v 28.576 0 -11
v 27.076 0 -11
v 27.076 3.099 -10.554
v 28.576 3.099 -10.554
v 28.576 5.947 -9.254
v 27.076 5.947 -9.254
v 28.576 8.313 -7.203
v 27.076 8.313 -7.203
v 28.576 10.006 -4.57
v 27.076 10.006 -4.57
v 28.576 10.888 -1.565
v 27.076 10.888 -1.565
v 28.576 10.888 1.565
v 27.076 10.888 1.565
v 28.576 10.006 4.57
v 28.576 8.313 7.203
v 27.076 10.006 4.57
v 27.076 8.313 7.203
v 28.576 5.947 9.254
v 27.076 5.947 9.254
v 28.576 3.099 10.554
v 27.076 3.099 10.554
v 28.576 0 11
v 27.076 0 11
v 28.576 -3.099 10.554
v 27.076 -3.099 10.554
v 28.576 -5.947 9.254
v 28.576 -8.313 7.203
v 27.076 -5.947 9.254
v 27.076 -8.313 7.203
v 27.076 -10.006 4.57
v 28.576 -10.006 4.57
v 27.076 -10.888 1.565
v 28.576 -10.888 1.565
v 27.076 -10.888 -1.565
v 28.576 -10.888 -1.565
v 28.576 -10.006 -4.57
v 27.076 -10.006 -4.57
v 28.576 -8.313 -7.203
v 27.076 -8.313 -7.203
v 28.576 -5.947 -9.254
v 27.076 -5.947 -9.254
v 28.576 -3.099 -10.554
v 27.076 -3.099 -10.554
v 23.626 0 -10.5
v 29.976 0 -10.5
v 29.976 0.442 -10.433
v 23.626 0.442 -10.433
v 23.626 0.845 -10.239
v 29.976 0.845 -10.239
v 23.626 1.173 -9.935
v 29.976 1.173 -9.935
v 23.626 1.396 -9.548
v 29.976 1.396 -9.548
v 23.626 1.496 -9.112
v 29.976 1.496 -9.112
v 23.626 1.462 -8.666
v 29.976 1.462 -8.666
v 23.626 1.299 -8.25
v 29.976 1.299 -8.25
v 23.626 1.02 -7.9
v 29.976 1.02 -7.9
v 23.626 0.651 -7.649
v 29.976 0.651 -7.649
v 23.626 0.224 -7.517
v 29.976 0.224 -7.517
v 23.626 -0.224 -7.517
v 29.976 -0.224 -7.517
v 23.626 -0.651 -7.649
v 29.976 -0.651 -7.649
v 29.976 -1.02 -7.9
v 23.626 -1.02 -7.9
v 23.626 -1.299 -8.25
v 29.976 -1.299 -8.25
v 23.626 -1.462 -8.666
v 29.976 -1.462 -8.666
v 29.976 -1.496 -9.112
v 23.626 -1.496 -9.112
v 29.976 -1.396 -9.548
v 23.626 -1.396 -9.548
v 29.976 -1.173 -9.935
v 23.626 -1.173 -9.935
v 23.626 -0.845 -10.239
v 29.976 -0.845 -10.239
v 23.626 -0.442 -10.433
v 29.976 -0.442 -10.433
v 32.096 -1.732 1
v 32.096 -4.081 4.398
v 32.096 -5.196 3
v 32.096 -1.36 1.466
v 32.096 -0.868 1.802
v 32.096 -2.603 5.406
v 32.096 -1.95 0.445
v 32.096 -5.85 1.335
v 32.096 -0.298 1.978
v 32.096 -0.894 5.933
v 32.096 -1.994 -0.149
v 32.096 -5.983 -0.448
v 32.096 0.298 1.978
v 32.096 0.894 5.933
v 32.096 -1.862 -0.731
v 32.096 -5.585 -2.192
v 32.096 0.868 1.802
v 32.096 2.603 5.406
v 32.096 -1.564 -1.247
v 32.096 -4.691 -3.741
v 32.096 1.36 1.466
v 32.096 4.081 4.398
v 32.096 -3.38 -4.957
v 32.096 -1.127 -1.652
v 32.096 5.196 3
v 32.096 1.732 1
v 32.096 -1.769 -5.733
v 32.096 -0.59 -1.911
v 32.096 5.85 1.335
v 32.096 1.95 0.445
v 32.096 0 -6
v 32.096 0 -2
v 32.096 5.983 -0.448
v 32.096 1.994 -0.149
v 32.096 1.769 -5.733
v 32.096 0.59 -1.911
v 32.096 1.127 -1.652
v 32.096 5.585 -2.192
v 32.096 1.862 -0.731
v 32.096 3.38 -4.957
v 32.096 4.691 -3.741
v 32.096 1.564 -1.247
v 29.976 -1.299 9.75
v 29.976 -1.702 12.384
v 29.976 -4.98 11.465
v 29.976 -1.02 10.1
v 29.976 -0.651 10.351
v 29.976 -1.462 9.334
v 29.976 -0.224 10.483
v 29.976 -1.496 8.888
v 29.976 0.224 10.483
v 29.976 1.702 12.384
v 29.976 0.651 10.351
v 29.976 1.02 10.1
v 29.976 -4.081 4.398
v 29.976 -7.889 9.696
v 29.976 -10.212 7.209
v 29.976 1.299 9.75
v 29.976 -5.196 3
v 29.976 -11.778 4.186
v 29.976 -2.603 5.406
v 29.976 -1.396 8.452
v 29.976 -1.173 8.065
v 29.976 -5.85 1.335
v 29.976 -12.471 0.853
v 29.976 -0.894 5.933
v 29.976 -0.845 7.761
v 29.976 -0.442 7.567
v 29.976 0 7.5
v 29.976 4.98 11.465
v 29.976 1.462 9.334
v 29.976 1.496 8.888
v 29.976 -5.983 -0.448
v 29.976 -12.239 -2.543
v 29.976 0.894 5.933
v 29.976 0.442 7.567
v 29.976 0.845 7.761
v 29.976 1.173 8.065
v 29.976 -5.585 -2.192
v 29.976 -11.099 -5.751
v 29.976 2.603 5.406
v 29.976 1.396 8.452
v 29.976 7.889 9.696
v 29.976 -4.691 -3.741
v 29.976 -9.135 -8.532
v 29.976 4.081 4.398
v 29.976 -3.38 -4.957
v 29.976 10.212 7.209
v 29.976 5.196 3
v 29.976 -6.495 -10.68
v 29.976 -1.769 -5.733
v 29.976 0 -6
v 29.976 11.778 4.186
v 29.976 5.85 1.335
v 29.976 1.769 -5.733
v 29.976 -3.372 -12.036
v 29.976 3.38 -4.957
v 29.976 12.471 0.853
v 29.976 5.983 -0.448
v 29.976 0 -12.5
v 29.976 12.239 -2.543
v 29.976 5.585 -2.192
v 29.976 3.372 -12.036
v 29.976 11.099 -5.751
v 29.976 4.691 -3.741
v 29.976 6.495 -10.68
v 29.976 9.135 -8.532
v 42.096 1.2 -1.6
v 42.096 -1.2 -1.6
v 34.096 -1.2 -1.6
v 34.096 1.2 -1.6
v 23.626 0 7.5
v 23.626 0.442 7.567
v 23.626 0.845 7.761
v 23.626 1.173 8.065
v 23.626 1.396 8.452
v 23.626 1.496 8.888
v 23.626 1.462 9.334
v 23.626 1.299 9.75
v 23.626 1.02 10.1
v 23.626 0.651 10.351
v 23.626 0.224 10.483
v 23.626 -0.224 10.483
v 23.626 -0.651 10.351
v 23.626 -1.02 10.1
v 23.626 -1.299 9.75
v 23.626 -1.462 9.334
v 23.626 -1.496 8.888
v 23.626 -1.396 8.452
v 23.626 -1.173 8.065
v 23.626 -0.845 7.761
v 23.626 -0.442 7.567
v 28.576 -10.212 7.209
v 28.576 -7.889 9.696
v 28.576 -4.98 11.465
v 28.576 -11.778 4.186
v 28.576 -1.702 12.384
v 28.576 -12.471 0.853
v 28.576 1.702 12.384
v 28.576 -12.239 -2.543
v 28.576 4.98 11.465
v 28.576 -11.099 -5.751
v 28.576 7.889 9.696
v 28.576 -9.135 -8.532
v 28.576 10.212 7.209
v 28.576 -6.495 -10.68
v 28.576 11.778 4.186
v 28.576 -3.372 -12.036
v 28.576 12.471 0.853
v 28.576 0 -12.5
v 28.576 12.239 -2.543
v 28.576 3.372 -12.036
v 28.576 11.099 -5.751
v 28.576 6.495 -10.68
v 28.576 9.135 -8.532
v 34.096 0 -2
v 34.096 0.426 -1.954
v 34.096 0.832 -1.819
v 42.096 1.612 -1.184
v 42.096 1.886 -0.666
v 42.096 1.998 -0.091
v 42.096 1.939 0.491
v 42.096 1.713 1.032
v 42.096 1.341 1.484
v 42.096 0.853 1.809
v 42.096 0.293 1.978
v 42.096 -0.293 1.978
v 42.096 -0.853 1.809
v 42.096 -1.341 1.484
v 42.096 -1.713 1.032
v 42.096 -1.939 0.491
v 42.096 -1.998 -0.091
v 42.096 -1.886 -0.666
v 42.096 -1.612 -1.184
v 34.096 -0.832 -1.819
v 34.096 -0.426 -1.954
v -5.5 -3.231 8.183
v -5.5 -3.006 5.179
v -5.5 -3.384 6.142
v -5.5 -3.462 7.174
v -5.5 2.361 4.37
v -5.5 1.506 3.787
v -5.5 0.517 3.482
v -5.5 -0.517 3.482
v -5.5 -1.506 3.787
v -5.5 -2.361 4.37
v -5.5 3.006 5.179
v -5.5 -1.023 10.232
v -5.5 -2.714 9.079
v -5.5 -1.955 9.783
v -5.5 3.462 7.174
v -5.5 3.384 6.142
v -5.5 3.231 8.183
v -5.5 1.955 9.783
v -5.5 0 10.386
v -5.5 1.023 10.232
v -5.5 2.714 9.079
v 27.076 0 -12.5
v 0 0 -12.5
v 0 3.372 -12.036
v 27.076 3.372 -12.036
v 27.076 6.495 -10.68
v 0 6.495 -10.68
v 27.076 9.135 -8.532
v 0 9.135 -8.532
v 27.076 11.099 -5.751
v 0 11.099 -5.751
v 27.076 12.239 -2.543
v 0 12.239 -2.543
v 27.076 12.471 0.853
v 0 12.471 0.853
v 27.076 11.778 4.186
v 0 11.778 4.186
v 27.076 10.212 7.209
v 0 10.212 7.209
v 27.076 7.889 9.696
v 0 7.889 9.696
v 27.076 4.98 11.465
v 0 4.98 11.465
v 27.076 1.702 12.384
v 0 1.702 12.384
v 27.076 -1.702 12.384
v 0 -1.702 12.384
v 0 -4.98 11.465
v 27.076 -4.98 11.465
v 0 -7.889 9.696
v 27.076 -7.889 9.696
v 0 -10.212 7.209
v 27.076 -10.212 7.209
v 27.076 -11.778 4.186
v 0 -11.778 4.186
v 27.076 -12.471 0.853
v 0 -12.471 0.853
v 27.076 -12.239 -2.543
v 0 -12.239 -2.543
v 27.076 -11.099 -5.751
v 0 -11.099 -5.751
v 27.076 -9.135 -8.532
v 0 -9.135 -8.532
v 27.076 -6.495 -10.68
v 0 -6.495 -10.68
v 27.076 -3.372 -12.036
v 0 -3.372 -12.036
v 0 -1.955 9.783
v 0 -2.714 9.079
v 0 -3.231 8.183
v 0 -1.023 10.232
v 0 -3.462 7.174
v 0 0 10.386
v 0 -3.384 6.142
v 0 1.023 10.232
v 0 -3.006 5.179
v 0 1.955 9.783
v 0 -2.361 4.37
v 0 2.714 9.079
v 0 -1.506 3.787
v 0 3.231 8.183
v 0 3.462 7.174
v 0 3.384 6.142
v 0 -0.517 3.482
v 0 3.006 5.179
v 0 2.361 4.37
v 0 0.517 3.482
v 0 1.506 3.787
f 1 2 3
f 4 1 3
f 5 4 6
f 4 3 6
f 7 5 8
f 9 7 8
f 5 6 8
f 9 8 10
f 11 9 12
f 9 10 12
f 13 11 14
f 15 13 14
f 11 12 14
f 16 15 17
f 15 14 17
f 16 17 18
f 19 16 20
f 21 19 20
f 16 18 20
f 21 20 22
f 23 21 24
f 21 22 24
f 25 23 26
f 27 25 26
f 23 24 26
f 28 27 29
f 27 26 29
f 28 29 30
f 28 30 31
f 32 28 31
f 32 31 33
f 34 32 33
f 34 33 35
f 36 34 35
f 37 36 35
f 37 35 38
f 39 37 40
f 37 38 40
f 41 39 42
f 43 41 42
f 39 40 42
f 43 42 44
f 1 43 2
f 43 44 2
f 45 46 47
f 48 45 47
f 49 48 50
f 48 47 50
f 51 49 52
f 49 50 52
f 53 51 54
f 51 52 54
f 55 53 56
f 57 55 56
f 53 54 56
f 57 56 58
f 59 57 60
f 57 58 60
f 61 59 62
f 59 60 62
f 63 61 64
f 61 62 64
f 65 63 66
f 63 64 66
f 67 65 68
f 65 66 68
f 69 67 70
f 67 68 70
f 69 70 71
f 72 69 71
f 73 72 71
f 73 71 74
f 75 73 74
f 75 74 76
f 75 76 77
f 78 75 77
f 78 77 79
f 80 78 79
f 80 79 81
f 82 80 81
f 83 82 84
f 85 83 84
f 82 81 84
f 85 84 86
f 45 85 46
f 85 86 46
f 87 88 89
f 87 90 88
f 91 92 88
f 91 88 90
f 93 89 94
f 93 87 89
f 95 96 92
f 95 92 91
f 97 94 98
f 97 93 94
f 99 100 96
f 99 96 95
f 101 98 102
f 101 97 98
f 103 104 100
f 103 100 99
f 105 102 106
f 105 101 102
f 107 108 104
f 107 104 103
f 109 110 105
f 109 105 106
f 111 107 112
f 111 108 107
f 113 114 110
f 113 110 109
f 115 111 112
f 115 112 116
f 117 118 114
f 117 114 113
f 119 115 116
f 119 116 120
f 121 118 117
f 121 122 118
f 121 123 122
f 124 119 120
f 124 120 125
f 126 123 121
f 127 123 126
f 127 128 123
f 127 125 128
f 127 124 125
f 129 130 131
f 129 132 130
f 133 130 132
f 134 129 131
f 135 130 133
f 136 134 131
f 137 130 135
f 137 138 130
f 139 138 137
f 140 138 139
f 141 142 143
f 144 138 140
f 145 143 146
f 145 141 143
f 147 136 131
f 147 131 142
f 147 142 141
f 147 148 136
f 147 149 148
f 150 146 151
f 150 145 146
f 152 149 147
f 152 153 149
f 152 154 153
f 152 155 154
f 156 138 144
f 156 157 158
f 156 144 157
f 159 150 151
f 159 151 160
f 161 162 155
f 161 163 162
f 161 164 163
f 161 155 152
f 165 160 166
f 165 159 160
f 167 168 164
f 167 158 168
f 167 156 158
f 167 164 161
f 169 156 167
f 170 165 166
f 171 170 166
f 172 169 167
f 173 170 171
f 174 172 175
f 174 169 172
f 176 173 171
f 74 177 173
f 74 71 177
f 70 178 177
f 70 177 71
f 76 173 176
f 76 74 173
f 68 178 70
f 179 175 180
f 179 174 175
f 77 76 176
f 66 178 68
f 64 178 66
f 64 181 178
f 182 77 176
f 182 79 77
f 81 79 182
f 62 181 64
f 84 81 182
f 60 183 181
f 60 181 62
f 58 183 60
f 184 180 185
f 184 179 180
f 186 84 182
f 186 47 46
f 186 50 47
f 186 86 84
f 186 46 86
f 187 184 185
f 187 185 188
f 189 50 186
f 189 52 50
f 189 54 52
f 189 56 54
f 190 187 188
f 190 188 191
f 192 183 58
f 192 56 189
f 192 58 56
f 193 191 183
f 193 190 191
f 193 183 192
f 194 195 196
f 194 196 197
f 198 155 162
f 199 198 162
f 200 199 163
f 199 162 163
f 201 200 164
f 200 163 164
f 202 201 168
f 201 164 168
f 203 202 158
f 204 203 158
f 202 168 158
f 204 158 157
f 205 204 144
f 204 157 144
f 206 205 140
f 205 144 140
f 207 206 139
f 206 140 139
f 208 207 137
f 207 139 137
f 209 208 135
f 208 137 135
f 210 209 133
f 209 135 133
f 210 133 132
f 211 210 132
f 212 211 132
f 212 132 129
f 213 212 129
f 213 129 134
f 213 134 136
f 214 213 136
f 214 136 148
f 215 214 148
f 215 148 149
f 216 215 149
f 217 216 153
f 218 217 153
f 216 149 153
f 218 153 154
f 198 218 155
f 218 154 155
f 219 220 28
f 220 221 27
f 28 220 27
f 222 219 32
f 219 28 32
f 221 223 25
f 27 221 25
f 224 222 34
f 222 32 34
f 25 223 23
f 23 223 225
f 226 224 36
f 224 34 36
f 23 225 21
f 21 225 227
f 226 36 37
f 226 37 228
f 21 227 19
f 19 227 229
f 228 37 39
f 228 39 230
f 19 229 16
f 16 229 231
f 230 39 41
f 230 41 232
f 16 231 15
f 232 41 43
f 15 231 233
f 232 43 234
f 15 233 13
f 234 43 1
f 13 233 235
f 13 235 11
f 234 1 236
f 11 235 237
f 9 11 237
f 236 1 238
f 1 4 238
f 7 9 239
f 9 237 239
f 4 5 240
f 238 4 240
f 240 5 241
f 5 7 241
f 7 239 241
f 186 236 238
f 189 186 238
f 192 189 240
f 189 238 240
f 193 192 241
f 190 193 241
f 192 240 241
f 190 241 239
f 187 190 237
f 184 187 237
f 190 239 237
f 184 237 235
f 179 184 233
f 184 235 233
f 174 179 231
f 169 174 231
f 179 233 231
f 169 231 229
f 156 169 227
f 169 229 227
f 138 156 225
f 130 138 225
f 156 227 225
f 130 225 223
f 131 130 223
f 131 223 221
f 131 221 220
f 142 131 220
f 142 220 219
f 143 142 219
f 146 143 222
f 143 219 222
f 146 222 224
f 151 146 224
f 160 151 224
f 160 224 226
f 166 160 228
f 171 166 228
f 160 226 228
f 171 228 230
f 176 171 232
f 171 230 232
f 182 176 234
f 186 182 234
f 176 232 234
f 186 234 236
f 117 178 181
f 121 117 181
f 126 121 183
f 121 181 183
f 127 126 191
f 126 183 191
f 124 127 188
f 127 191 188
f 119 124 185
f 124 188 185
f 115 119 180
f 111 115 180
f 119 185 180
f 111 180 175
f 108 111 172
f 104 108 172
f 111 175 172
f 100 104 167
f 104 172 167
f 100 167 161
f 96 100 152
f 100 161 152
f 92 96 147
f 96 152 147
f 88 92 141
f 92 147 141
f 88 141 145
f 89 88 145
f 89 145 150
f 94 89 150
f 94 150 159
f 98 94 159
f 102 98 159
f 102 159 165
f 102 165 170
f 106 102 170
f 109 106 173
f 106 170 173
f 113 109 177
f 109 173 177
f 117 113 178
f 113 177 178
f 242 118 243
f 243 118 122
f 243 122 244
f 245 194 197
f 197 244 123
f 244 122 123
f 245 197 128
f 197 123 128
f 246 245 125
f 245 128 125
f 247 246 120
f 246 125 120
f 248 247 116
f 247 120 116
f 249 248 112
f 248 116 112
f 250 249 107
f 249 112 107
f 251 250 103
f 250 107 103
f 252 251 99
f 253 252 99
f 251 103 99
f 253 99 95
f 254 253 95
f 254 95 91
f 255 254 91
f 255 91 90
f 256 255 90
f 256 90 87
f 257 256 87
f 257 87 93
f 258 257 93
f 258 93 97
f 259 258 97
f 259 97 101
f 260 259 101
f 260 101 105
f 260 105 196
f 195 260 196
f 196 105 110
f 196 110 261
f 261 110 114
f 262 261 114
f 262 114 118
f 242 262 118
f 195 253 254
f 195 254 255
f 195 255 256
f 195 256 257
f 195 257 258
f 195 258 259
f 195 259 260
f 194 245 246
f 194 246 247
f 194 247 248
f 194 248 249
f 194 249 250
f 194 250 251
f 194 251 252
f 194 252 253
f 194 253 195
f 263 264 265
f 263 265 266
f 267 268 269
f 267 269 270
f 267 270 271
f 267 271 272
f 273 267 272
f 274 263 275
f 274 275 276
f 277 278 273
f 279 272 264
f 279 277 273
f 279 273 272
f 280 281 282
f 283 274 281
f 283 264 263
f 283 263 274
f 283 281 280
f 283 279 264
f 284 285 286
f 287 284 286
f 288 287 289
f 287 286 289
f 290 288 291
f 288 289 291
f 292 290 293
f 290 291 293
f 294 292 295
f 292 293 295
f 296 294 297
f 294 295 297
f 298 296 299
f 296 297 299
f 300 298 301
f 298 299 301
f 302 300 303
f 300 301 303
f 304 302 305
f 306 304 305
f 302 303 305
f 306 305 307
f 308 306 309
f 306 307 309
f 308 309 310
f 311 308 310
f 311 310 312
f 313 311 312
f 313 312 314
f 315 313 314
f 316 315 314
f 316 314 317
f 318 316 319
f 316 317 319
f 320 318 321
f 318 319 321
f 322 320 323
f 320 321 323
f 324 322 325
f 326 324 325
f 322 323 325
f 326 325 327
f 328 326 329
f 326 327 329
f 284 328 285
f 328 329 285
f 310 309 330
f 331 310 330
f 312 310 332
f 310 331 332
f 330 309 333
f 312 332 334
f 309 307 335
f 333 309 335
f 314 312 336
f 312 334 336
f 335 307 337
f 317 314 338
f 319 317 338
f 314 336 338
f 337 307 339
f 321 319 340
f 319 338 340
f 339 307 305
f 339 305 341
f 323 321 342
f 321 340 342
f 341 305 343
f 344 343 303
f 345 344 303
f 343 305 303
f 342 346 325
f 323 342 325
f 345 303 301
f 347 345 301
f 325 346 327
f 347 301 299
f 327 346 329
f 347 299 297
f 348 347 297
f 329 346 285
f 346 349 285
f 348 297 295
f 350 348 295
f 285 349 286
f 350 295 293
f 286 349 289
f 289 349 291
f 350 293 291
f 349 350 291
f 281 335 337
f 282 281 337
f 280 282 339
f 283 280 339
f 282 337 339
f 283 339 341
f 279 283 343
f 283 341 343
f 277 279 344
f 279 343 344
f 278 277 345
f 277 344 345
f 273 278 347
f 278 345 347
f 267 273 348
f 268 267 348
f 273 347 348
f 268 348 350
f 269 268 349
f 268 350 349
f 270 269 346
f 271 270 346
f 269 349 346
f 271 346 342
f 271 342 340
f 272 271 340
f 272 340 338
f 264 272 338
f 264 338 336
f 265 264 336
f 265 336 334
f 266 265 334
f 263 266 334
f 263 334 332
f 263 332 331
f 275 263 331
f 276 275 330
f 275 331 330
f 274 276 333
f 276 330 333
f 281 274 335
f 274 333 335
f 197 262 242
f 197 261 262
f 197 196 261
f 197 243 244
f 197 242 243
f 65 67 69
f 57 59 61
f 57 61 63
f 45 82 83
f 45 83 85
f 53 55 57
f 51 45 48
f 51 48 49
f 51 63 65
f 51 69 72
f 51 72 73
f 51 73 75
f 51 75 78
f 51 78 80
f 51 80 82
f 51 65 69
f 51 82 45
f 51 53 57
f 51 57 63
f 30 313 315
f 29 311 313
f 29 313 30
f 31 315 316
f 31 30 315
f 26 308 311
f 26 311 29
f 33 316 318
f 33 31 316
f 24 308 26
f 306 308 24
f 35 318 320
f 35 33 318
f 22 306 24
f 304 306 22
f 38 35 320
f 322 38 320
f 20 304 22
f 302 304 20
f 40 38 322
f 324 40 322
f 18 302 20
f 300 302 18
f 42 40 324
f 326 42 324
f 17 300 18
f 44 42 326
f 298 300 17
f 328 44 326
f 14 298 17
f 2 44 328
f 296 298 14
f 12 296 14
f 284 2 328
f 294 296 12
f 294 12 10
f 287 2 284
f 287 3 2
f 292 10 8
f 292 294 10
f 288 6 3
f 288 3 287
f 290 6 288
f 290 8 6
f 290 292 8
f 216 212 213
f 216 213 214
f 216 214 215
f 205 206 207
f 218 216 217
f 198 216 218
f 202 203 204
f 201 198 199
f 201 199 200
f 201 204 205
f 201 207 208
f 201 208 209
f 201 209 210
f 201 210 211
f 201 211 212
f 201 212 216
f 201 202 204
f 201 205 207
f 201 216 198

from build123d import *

# Parameters (mm, degrees)
SKETCH1_R           = 12.5
BOSS_EXTRUDE1_DEPTH = 27.0764
SKETCH2_R           = 11
BOSS_EXTRUDE2_DEPTH = 1.5
SKETCH3_R           = 12.5
BOSS_EXTRUDE3_DEPTH = 1.4
SKETCH4_R           = 6
BOSS_EXTRUDE4_DEPTH = 2.12
SKETCH5_R           = 2
BOSS_EXTRUDE5_DEPTH = 10
SKETCH6_W           = 2.63743778
SKETCH6_H           = 6.664381858
CUT_EXTRUDE1_DEPTH  = 8
SKETCH8_R           = 1.5
CUT_EXTRUDE2_DEPTH  = 6.35
SKETCH9_R           = 3.471368159
BOSS_EXTRUDE6_DEPTH = 5.5


with BuildPart() as part:
    # Sketch1 → Boss-Extrude1 (new body)
    with BuildSketch(Plane(origin=(0, 0, 0), x_dir=(0, 0, -1), z_dir=(1, 0, 0))):
        Circle(SKETCH1_R)
    extrude(amount=BOSS_EXTRUDE1_DEPTH)

    # Sketch2 → Boss-Extrude2 (add)
    with BuildSketch(Plane(origin=(27.0764, 0, 0), x_dir=(0, 0, -1), z_dir=(1, 0, 0))):
        Circle(SKETCH2_R)
    extrude(amount=BOSS_EXTRUDE2_DEPTH)

    # Sketch3 → Boss-Extrude3 (add)
    with BuildSketch(Plane(origin=(28.5764, 0, 0), x_dir=(0, 0, -1), z_dir=(1, 0, 0))):
        Circle(SKETCH3_R)
    extrude(amount=BOSS_EXTRUDE3_DEPTH)

    # Sketch4 → Boss-Extrude4 (add)
    with BuildSketch(Plane(origin=(29.9764, 0, 0), x_dir=(0, 0, -1), z_dir=(1, 0, 0))):
        Circle(SKETCH4_R)
    extrude(amount=BOSS_EXTRUDE4_DEPTH)

    # Sketch5 → Boss-Extrude5 (add)
    with BuildSketch(Plane(origin=(32.0964, 0, 0), x_dir=(0, 0, -1), z_dir=(1, 0, 0))):
        Circle(SKETCH5_R)
    extrude(amount=BOSS_EXTRUDE5_DEPTH)

    # Sketch6 → Cut-Extrude1 (cut)
    with BuildSketch(Plane(origin=(42.0964, 0, 0), x_dir=(0, 0, -1), z_dir=(1, 0, 0))):
        with Locations((2.91871889, -0.060449415)):
            Rectangle(SKETCH6_W, SKETCH6_H)
    extrude(amount=-CUT_EXTRUDE1_DEPTH, mode=Mode.SUBTRACT)

    # Sketch8 → Cut-Extrude2 (cut)
    with BuildSketch(Plane(origin=(29.9764, 0, 0), x_dir=(0, 0, -1), z_dir=(1, 0, 0))):
        with Locations((9, 0)):
            Circle(SKETCH8_R)
        with Locations((-9, 0)):
            Circle(SKETCH8_R)
    extrude(amount=-CUT_EXTRUDE2_DEPTH, mode=Mode.SUBTRACT)

    # Sketch9 → Boss-Extrude6 (add)
    with BuildSketch(Plane.ZY):
        with Locations((6.914557356, 0)):
            Circle(SKETCH9_R)
    extrude(amount=BOSS_EXTRUDE6_DEPTH)


solid = part.part
